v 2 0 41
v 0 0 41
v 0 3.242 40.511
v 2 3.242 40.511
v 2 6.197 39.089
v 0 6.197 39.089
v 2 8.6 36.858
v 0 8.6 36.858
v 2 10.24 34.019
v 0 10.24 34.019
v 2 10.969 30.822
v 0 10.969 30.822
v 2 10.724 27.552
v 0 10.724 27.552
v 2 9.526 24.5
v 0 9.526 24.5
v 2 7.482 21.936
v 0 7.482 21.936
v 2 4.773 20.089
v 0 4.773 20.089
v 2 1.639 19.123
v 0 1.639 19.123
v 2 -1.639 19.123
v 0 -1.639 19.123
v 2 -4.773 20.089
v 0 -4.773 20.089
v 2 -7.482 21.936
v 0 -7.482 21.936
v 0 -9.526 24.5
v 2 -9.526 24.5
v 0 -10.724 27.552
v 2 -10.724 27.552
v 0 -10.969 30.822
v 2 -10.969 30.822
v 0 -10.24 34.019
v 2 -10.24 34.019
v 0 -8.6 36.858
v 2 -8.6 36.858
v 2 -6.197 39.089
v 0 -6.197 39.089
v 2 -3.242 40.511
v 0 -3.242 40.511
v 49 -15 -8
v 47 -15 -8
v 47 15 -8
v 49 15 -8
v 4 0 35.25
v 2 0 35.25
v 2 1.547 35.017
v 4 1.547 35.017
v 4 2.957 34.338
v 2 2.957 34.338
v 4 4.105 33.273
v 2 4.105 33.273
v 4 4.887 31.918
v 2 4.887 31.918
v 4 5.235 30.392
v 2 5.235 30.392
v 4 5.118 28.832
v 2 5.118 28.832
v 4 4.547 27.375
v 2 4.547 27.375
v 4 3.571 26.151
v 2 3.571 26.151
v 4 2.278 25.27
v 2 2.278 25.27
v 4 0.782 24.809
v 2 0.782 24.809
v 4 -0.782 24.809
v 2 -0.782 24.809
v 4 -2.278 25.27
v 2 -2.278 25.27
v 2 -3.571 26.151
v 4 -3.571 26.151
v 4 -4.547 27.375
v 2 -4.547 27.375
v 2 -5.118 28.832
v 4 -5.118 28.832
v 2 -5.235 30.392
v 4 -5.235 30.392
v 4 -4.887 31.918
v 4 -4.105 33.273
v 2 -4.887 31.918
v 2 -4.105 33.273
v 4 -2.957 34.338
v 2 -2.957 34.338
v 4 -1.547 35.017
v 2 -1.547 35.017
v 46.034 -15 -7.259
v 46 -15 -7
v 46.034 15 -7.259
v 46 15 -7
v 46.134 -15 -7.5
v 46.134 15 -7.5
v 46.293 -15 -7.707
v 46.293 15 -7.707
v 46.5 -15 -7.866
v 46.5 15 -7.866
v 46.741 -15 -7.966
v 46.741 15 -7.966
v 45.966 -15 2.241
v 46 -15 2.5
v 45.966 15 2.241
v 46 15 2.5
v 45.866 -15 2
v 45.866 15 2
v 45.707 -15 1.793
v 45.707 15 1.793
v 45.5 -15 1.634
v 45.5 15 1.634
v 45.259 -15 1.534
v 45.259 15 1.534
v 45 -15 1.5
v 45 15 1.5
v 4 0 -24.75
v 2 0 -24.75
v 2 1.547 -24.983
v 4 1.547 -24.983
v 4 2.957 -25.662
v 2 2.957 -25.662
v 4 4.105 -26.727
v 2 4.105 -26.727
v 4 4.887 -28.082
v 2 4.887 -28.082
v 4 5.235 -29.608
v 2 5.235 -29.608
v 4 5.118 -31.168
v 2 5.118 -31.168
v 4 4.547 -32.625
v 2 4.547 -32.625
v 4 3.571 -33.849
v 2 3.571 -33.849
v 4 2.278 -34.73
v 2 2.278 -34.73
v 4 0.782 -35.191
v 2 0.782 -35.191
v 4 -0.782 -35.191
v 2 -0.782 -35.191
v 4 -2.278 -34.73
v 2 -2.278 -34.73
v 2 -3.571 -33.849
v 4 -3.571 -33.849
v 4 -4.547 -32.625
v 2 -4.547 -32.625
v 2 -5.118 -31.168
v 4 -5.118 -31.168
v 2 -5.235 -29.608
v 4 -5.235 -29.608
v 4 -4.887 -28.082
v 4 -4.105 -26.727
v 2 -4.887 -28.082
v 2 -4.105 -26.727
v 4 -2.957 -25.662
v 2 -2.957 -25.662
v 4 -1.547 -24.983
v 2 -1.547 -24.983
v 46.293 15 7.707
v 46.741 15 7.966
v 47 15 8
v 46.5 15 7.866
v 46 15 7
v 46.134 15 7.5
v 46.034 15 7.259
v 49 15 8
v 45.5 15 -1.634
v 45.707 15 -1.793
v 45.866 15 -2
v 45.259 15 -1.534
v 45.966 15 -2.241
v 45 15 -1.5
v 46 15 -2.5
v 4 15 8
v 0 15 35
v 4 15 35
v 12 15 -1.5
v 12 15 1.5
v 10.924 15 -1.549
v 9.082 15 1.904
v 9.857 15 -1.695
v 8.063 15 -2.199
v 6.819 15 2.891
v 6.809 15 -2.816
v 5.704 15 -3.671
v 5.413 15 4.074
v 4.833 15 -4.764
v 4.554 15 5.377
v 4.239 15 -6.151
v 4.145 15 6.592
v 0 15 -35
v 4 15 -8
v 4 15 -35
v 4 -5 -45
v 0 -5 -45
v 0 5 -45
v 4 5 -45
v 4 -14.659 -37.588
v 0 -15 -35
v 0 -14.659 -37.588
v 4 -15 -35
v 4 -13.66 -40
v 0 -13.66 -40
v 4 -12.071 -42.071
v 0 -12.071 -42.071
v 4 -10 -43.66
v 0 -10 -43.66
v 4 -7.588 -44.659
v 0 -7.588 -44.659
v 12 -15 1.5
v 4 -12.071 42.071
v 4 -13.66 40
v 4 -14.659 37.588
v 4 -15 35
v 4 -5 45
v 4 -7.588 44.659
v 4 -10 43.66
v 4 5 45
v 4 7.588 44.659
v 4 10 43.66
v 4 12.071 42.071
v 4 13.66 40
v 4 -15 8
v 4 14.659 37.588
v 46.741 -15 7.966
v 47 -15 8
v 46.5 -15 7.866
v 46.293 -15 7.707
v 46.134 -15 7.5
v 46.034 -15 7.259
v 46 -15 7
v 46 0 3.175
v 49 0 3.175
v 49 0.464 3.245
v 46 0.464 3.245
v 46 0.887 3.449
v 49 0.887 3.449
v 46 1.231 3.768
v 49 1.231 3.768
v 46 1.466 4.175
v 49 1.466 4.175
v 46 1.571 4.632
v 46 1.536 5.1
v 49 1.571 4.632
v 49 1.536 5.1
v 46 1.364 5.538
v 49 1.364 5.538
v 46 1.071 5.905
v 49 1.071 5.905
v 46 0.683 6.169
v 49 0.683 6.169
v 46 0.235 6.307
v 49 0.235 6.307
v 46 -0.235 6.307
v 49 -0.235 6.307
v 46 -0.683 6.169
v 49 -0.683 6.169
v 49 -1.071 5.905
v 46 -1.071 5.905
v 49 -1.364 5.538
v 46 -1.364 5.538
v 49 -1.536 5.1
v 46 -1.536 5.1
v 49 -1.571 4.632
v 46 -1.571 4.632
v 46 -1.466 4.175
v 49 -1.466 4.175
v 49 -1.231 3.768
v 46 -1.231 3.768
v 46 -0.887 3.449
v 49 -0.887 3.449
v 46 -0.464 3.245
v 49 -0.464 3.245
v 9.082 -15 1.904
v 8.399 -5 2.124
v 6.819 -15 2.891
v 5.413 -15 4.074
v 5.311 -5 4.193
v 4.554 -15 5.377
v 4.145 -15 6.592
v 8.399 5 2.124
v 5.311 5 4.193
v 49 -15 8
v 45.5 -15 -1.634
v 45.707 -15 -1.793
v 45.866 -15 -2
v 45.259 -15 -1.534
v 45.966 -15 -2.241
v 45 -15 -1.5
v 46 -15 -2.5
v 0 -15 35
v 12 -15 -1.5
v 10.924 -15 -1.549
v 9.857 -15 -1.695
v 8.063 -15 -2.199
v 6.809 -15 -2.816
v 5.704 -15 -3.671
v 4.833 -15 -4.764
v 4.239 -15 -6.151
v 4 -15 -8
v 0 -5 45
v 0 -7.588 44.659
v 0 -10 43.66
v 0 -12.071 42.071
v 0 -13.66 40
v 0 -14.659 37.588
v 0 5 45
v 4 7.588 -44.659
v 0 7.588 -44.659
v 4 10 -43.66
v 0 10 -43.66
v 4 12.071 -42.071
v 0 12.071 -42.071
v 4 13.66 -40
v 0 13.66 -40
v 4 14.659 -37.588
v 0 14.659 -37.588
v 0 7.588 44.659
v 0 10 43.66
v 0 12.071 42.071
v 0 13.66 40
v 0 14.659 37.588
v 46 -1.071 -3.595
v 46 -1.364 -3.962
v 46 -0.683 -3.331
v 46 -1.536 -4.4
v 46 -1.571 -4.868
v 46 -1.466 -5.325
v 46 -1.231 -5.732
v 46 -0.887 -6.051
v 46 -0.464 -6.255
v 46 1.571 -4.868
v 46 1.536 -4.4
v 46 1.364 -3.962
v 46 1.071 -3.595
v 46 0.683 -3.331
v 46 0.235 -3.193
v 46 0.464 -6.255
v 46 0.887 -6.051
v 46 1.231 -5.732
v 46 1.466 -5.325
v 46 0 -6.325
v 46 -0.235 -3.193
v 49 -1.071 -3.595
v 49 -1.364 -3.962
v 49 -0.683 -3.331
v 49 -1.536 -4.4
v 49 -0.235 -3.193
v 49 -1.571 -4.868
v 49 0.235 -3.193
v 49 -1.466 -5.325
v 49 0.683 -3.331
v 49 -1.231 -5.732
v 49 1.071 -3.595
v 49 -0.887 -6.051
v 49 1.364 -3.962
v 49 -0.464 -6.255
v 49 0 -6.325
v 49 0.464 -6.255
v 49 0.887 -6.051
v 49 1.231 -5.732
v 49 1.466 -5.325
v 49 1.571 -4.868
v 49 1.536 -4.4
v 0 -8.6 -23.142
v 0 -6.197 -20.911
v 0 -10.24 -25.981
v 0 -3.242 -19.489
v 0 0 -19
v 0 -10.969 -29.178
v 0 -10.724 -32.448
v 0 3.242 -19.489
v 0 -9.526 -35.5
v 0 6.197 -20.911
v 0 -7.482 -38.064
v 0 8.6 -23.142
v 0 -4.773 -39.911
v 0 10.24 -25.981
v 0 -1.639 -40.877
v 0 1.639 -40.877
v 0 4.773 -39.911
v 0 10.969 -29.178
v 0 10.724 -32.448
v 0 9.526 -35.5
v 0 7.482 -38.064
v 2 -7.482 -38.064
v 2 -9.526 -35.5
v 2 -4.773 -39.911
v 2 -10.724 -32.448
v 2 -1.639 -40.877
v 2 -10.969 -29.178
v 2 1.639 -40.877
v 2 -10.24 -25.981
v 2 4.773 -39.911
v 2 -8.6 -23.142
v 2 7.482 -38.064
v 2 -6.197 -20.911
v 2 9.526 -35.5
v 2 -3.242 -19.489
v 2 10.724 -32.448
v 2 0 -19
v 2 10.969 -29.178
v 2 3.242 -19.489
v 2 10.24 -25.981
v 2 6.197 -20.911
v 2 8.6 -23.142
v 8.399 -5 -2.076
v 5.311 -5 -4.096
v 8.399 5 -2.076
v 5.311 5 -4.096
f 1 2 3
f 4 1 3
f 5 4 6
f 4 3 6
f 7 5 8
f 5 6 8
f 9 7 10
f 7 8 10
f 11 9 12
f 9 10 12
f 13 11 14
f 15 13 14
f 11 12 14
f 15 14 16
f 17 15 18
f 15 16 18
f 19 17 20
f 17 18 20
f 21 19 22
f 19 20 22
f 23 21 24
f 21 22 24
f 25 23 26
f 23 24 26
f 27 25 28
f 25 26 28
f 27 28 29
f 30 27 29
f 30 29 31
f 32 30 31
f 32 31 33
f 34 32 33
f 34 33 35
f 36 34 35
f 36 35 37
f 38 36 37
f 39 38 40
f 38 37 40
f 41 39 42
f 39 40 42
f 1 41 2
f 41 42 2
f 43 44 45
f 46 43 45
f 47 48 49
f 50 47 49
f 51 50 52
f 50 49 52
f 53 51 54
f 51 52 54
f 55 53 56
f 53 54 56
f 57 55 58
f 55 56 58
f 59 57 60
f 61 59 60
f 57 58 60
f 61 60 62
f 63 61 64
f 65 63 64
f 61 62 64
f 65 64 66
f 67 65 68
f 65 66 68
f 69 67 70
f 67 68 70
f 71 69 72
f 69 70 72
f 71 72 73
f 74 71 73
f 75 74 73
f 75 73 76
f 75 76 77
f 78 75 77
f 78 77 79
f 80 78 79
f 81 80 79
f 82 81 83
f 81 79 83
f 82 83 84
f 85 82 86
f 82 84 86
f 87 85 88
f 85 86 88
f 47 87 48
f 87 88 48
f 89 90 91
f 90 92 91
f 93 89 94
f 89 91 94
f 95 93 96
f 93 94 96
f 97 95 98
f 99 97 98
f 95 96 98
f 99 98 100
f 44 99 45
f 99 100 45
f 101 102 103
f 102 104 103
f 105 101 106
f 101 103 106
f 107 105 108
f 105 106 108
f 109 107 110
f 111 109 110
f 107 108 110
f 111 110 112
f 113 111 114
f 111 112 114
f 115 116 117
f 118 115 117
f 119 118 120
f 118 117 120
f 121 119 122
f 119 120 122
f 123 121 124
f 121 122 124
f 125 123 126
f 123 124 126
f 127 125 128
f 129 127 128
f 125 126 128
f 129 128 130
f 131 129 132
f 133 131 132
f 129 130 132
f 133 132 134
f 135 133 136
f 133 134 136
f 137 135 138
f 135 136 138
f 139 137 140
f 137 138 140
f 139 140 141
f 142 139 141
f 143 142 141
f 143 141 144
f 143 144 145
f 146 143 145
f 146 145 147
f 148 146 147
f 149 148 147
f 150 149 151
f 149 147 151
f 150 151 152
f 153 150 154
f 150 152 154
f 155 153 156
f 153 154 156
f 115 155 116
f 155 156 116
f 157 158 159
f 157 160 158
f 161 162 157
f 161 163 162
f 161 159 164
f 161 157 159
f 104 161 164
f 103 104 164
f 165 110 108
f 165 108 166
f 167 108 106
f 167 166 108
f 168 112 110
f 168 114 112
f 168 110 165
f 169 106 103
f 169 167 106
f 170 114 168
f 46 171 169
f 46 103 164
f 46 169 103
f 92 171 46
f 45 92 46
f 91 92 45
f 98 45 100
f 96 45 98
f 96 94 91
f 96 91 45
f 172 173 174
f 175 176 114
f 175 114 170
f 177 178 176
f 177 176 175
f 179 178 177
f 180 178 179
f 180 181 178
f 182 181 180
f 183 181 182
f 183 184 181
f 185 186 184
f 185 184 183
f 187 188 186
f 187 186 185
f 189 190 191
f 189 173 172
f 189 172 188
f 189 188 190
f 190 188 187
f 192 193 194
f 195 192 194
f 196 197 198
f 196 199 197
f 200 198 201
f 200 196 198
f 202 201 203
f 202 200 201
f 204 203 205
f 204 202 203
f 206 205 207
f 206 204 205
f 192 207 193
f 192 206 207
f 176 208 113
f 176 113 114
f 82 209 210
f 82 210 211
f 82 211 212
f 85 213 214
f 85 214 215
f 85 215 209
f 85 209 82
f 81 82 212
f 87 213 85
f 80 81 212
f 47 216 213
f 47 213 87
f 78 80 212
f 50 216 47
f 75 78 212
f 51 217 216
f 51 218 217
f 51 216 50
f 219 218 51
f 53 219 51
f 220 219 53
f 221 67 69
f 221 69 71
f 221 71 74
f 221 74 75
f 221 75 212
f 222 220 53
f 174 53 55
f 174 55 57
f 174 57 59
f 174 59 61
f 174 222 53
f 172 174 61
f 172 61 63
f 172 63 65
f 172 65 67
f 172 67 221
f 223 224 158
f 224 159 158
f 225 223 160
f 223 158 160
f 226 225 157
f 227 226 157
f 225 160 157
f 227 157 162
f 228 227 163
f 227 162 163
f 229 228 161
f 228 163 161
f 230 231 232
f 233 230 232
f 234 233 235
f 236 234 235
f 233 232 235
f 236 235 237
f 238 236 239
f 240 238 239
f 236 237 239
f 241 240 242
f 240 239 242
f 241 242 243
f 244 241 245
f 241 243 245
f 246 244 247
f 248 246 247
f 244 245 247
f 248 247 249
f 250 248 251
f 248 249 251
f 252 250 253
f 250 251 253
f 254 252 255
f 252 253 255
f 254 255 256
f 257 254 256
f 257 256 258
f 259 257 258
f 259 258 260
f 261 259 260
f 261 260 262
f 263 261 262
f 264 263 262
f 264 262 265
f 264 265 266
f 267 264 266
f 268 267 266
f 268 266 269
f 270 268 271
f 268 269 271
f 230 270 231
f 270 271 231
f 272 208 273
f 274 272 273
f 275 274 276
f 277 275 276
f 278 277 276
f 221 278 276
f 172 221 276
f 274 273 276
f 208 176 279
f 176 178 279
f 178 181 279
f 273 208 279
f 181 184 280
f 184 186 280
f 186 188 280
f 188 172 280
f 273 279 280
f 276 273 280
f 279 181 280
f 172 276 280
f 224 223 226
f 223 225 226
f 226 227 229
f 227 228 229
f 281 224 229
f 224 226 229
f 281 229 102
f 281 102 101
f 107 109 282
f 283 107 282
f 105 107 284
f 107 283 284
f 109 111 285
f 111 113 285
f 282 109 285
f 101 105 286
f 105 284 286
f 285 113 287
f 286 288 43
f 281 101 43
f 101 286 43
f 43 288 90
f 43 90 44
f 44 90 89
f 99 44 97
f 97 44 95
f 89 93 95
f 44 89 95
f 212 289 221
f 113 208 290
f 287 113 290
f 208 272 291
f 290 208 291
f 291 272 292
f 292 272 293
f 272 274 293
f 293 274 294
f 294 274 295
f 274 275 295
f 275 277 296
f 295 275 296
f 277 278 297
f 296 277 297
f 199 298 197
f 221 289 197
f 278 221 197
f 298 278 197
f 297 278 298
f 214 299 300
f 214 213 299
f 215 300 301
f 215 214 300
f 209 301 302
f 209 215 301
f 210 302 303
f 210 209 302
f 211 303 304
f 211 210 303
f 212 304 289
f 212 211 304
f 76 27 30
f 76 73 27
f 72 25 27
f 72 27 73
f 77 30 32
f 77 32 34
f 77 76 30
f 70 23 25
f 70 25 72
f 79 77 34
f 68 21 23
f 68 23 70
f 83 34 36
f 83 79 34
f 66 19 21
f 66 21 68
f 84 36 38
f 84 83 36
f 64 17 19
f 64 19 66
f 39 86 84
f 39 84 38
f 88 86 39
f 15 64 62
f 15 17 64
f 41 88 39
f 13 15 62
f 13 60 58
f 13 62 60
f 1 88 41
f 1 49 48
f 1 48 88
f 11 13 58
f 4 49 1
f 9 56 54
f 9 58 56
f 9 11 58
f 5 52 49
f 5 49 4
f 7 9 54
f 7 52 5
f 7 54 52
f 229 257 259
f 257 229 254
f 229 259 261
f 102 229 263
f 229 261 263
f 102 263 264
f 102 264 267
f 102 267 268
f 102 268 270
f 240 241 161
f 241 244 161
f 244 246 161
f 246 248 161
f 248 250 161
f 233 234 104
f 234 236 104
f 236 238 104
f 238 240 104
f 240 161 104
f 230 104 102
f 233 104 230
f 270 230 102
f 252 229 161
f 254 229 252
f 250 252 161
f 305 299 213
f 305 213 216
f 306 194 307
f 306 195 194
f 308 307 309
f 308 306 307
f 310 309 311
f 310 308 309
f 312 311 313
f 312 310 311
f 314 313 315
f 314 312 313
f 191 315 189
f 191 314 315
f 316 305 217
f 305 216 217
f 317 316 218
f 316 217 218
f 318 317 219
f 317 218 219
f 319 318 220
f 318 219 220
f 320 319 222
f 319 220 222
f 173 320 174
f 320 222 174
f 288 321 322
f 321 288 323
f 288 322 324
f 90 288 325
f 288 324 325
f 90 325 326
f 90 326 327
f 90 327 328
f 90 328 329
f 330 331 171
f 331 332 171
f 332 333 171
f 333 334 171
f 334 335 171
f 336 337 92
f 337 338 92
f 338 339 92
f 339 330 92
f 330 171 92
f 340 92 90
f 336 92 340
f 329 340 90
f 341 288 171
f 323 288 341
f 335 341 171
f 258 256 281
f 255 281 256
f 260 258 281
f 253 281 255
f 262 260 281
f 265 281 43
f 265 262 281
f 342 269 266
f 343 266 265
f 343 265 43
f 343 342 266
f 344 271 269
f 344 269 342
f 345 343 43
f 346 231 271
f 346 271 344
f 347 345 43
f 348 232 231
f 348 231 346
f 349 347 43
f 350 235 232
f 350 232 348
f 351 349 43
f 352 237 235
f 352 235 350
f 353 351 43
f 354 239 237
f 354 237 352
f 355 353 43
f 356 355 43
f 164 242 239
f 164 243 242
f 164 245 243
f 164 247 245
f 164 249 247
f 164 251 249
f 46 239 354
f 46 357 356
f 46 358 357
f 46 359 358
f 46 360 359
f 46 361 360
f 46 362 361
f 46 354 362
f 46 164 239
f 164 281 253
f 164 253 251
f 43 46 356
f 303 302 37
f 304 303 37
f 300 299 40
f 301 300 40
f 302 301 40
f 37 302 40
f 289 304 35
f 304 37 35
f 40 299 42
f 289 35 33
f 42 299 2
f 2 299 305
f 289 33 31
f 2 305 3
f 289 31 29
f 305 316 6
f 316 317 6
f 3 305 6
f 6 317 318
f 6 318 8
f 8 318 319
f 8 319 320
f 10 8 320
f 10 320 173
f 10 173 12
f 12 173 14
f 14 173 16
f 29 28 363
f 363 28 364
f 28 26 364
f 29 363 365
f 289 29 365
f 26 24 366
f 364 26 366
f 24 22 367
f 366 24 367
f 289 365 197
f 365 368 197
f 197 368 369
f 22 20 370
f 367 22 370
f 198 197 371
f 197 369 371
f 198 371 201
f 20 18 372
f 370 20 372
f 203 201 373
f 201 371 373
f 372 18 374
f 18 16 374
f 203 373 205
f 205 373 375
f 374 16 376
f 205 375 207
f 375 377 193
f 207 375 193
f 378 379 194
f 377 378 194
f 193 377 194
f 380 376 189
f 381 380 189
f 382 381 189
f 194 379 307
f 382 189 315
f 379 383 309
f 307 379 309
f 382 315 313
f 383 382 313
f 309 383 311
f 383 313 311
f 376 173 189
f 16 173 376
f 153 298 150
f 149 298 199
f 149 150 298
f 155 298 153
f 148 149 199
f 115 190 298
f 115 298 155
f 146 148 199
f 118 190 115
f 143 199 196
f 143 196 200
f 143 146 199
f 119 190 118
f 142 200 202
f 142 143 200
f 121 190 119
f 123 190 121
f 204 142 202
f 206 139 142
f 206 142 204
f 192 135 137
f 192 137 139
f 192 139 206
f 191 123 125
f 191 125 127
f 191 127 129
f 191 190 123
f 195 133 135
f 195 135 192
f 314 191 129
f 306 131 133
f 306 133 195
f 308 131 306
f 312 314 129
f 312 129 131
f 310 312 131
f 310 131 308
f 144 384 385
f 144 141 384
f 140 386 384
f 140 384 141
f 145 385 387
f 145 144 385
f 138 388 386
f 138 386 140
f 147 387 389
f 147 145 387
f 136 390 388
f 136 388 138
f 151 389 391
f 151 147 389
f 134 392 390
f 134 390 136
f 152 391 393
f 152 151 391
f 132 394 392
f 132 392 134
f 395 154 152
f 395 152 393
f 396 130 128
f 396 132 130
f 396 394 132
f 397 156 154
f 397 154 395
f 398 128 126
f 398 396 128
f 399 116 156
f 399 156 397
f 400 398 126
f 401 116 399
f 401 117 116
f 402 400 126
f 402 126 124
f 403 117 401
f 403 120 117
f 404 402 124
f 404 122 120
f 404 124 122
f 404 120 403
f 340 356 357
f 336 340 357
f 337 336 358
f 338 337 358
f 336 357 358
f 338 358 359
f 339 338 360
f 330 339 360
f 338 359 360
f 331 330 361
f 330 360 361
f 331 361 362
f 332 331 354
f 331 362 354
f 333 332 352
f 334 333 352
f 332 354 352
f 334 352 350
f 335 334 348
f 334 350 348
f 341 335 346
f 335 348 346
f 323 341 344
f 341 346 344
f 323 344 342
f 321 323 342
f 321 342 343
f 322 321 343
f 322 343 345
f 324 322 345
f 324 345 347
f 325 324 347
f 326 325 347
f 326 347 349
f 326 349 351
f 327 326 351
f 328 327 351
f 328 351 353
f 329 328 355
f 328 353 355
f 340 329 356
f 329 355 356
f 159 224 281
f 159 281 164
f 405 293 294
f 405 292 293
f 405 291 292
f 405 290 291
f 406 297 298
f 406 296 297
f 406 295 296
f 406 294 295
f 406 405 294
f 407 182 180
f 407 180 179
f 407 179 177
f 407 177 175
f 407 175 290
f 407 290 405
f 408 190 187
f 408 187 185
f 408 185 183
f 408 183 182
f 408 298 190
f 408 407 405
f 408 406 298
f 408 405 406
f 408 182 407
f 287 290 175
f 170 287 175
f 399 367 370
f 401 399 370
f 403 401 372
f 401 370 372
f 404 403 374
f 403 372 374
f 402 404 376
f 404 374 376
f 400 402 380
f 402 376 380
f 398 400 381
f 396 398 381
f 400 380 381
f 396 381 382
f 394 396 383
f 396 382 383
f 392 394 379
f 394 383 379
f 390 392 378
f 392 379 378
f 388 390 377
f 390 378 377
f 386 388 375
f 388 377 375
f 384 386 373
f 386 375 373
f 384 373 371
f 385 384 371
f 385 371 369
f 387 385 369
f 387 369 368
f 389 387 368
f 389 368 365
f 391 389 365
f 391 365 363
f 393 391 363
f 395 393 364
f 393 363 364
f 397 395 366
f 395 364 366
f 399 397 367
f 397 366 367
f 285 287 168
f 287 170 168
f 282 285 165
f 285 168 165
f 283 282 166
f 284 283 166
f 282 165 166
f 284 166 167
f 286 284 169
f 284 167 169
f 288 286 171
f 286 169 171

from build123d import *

# Parameters (mm, degrees)
SKETCH1_W                = 90
SKETCH1_H                = 30
BOSS_EXTRUDE1_DEPTH      = 4
FILLET1_R                = 10
SKETCH2_R                = 1.25
CUT_EXTRUDE1_DEPTH       = 48.602520942
SKETCH3_R                = 1.25
CUT_EXTRUDE2_DEPTH       = 48.602520942
SKETCH4_W                = 16
SKETCH4_H                = 30
BOSS_EXTRUDE5_DEPTH      = 3
SKETCH11_W               = 3
SKETCH11_H               = 30
BOSS_EXTRUDE6_DEPTH      = 39
SKETCH12_W               = 16
SKETCH12_H               = 30
BOSS_EXTRUDE7_DEPTH      = 3
SKETCH14_R               = 1.575
CUT_EXTRUDE7_DEPTH       = 3
SKETCH13_R               = 1.575
CUT_EXTRUDE8_DEPTH       = 3
FILLET2_R                = 5
CUT_EXTRUDE10_START      = -30
CUT_EXTRUDE10_DEPTH      = 30
CUT_EXTRUDE11_DEPTH      = 73.97944927
CUT_EXTRUDE11_DEPTH_BACK = 73.97944927
FILLET3_R                = 1
SKETCH18_R               = 11
CUT_EXTRUDE12_DEPTH      = 2
SKETCH19_R               = 11
CUT_EXTRUDE13_DEPTH      = 2
SKETCH20_R               = 5.25
CUT_EXTRUDE14_DEPTH      = 2
SKETCH21_R               = 5.25
CUT_EXTRUDE15_DEPTH      = 2


# Read off the part's stored shape, not the designer's step: Cut-Extrude10
with BuildPart() as part:
    # Sketch1 → Boss-Extrude1 (new body)
    with BuildSketch(Plane(origin=(0, 0, 0), x_dir=(0, 0, -1), z_dir=(1, 0, 0))):
        Rectangle(SKETCH1_W, SKETCH1_H)
    extrude(amount=BOSS_EXTRUDE1_DEPTH)

    # Fillet1
    fillet1_edges = [part.edges().sort_by_distance(p)[0] for p in [
        (2, -15, -45),
        (2, -15, 45),
        (2, 15, 45),
        (2, 15, -45),
    ]]
    fillet(fillet1_edges, radius=FILLET1_R)

    # Sketch2 → Cut-Extrude1 (cut, through all)
    with BuildSketch(Plane(origin=(4, 0, 0), x_dir=(0, 0, -1), z_dir=(1, 0, 0))):
        with Locations((-30, 0)):
            Circle(SKETCH2_R)
    extrude(amount=-CUT_EXTRUDE1_DEPTH, mode=Mode.SUBTRACT)

    # Sketch3 → Cut-Extrude2 (cut, through all)
    with BuildSketch(Plane(origin=(4, 0, 0), x_dir=(0, 0, -1), z_dir=(1, 0, 0))):
        with Locations((30, 0)):
            Circle(SKETCH3_R)
    extrude(amount=-CUT_EXTRUDE2_DEPTH, mode=Mode.SUBTRACT)

    # Sketch4 → Boss-Extrude5 (add)
    with BuildSketch(Plane(origin=(4, 0, 0), x_dir=(0, 0, -1), z_dir=(1, 0, 0))):
        Rectangle(SKETCH4_W, SKETCH4_H)
    extrude(amount=BOSS_EXTRUDE5_DEPTH)

    # Sketch11 → Boss-Extrude6 (add)
    with BuildSketch(Plane(origin=(7, 0, 0), x_dir=(0, 0, -1), z_dir=(1, 0, 0))):
        Rectangle(SKETCH11_W, SKETCH11_H)
    extrude(amount=BOSS_EXTRUDE6_DEPTH)

    # Sketch12 → Boss-Extrude7 (add)
    with BuildSketch(Plane(origin=(46, 0, 0), x_dir=(0, 0, -1), z_dir=(1, 0, 0))):
        Rectangle(SKETCH12_W, SKETCH12_H)
    extrude(amount=BOSS_EXTRUDE7_DEPTH)

    # Sketch14 → Cut-Extrude7 (cut)
    with BuildSketch(Plane(origin=(49, 0, 0), x_dir=(0, 0, -1), z_dir=(1, 0, 0))):
        with Locations((4.75, 0)):
            Circle(SKETCH14_R)
    extrude(amount=-CUT_EXTRUDE7_DEPTH, mode=Mode.SUBTRACT)

    # Sketch13 → Cut-Extrude8 (cut)
    with BuildSketch(Plane(origin=(49, 0, 0), x_dir=(0, 0, -1), z_dir=(1, 0, 0))):
        with Locations((-4.75, 0)):
            Circle(SKETCH13_R)
    extrude(amount=-CUT_EXTRUDE8_DEPTH, mode=Mode.SUBTRACT)

    # Fillet2
    fillet2_edges = [part.edges().sort_by_distance(p)[0] for p in [
        (7, 0, -1.5),
        (7, 0, 1.5),
    ]]
    fillet(fillet2_edges, radius=FILLET2_R)

    # Cut-Extrude10 outline → Cut-Extrude10 (cut)
    with BuildSketch(Plane.XZ.offset(15).offset(CUT_EXTRUDE10_START)):
        with BuildLine():
            add(Edge.make_bspline(
                [(12, 1.5), (8.564078645, 1.5), (4, 3.226164853), (4, 8)],
                knots=[0, 0, 0, 0, 1, 1, 1, 1], degree=3))
            ThreePointArc((12, 1.5), (8.464466094, 2.964466094), (7, 6.5))
            Line((7, 6.5), (7, 8))
            Line((7, 8), (4, 8))
        make_face()
    extrude(amount=CUT_EXTRUDE10_DEPTH, mode=Mode.SUBTRACT)

    # Sketch16 → Cut-Extrude11 (cut, two sides: drawn at the far end of the back side and taken through both)
    with BuildSketch(Plane.XZ.offset(15).offset(-CUT_EXTRUDE11_DEPTH_BACK)):
        with BuildLine():
            ThreePointArc((7, -6.5), (8.464466094, -2.964466094), (12, -1.5))
            add(Edge.make_bspline(
                [(12, -1.5), (8.564078645, -1.5), (4, -3.006580432), (4, -8)],
                knots=[0, 0, 0, 0, 1, 1, 1, 1], degree=3))
            Line((4, -8), (7, -8))
            Line((7, -8), (7, -6.5))
        make_face()
    extrude(amount=CUT_EXTRUDE11_DEPTH + CUT_EXTRUDE11_DEPTH_BACK, mode=Mode.SUBTRACT)

    # Fillet3
    fillet3_edges = [part.edges().sort_by_distance(p)[0] for p in [
        (46, 0, -1.5),
        (46, 0, 1.5),
        (46, 0, 8),
        (46, 0, -8),
    ]]
    fillet(fillet3_edges, radius=FILLET3_R)

    # Sketch18 → Cut-Extrude12 (cut)
    with BuildSketch(Plane.ZY):
        with Locations((30, 0)):
            Circle(SKETCH18_R)
    extrude(amount=-CUT_EXTRUDE12_DEPTH, mode=Mode.SUBTRACT)

    # Sketch19 → Cut-Extrude13 (cut)
    with BuildSketch(Plane.ZY):
        with Locations((-30, 0)):
            Circle(SKETCH19_R)
    extrude(amount=-CUT_EXTRUDE13_DEPTH, mode=Mode.SUBTRACT)

    # Sketch20 → Cut-Extrude14 (cut)
    with BuildSketch(Plane.ZY.offset(-2)):
        with Locations((30, 0)):
            Circle(SKETCH20_R)
    extrude(amount=-CUT_EXTRUDE14_DEPTH, mode=Mode.SUBTRACT)

    # Sketch21 → Cut-Extrude15 (cut)
    with BuildSketch(Plane.ZY.offset(-2)):
        with Locations((-30, 0)):
            Circle(SKETCH21_R)
    extrude(amount=-CUT_EXTRUDE15_DEPTH, mode=Mode.SUBTRACT)


solid = part.part
